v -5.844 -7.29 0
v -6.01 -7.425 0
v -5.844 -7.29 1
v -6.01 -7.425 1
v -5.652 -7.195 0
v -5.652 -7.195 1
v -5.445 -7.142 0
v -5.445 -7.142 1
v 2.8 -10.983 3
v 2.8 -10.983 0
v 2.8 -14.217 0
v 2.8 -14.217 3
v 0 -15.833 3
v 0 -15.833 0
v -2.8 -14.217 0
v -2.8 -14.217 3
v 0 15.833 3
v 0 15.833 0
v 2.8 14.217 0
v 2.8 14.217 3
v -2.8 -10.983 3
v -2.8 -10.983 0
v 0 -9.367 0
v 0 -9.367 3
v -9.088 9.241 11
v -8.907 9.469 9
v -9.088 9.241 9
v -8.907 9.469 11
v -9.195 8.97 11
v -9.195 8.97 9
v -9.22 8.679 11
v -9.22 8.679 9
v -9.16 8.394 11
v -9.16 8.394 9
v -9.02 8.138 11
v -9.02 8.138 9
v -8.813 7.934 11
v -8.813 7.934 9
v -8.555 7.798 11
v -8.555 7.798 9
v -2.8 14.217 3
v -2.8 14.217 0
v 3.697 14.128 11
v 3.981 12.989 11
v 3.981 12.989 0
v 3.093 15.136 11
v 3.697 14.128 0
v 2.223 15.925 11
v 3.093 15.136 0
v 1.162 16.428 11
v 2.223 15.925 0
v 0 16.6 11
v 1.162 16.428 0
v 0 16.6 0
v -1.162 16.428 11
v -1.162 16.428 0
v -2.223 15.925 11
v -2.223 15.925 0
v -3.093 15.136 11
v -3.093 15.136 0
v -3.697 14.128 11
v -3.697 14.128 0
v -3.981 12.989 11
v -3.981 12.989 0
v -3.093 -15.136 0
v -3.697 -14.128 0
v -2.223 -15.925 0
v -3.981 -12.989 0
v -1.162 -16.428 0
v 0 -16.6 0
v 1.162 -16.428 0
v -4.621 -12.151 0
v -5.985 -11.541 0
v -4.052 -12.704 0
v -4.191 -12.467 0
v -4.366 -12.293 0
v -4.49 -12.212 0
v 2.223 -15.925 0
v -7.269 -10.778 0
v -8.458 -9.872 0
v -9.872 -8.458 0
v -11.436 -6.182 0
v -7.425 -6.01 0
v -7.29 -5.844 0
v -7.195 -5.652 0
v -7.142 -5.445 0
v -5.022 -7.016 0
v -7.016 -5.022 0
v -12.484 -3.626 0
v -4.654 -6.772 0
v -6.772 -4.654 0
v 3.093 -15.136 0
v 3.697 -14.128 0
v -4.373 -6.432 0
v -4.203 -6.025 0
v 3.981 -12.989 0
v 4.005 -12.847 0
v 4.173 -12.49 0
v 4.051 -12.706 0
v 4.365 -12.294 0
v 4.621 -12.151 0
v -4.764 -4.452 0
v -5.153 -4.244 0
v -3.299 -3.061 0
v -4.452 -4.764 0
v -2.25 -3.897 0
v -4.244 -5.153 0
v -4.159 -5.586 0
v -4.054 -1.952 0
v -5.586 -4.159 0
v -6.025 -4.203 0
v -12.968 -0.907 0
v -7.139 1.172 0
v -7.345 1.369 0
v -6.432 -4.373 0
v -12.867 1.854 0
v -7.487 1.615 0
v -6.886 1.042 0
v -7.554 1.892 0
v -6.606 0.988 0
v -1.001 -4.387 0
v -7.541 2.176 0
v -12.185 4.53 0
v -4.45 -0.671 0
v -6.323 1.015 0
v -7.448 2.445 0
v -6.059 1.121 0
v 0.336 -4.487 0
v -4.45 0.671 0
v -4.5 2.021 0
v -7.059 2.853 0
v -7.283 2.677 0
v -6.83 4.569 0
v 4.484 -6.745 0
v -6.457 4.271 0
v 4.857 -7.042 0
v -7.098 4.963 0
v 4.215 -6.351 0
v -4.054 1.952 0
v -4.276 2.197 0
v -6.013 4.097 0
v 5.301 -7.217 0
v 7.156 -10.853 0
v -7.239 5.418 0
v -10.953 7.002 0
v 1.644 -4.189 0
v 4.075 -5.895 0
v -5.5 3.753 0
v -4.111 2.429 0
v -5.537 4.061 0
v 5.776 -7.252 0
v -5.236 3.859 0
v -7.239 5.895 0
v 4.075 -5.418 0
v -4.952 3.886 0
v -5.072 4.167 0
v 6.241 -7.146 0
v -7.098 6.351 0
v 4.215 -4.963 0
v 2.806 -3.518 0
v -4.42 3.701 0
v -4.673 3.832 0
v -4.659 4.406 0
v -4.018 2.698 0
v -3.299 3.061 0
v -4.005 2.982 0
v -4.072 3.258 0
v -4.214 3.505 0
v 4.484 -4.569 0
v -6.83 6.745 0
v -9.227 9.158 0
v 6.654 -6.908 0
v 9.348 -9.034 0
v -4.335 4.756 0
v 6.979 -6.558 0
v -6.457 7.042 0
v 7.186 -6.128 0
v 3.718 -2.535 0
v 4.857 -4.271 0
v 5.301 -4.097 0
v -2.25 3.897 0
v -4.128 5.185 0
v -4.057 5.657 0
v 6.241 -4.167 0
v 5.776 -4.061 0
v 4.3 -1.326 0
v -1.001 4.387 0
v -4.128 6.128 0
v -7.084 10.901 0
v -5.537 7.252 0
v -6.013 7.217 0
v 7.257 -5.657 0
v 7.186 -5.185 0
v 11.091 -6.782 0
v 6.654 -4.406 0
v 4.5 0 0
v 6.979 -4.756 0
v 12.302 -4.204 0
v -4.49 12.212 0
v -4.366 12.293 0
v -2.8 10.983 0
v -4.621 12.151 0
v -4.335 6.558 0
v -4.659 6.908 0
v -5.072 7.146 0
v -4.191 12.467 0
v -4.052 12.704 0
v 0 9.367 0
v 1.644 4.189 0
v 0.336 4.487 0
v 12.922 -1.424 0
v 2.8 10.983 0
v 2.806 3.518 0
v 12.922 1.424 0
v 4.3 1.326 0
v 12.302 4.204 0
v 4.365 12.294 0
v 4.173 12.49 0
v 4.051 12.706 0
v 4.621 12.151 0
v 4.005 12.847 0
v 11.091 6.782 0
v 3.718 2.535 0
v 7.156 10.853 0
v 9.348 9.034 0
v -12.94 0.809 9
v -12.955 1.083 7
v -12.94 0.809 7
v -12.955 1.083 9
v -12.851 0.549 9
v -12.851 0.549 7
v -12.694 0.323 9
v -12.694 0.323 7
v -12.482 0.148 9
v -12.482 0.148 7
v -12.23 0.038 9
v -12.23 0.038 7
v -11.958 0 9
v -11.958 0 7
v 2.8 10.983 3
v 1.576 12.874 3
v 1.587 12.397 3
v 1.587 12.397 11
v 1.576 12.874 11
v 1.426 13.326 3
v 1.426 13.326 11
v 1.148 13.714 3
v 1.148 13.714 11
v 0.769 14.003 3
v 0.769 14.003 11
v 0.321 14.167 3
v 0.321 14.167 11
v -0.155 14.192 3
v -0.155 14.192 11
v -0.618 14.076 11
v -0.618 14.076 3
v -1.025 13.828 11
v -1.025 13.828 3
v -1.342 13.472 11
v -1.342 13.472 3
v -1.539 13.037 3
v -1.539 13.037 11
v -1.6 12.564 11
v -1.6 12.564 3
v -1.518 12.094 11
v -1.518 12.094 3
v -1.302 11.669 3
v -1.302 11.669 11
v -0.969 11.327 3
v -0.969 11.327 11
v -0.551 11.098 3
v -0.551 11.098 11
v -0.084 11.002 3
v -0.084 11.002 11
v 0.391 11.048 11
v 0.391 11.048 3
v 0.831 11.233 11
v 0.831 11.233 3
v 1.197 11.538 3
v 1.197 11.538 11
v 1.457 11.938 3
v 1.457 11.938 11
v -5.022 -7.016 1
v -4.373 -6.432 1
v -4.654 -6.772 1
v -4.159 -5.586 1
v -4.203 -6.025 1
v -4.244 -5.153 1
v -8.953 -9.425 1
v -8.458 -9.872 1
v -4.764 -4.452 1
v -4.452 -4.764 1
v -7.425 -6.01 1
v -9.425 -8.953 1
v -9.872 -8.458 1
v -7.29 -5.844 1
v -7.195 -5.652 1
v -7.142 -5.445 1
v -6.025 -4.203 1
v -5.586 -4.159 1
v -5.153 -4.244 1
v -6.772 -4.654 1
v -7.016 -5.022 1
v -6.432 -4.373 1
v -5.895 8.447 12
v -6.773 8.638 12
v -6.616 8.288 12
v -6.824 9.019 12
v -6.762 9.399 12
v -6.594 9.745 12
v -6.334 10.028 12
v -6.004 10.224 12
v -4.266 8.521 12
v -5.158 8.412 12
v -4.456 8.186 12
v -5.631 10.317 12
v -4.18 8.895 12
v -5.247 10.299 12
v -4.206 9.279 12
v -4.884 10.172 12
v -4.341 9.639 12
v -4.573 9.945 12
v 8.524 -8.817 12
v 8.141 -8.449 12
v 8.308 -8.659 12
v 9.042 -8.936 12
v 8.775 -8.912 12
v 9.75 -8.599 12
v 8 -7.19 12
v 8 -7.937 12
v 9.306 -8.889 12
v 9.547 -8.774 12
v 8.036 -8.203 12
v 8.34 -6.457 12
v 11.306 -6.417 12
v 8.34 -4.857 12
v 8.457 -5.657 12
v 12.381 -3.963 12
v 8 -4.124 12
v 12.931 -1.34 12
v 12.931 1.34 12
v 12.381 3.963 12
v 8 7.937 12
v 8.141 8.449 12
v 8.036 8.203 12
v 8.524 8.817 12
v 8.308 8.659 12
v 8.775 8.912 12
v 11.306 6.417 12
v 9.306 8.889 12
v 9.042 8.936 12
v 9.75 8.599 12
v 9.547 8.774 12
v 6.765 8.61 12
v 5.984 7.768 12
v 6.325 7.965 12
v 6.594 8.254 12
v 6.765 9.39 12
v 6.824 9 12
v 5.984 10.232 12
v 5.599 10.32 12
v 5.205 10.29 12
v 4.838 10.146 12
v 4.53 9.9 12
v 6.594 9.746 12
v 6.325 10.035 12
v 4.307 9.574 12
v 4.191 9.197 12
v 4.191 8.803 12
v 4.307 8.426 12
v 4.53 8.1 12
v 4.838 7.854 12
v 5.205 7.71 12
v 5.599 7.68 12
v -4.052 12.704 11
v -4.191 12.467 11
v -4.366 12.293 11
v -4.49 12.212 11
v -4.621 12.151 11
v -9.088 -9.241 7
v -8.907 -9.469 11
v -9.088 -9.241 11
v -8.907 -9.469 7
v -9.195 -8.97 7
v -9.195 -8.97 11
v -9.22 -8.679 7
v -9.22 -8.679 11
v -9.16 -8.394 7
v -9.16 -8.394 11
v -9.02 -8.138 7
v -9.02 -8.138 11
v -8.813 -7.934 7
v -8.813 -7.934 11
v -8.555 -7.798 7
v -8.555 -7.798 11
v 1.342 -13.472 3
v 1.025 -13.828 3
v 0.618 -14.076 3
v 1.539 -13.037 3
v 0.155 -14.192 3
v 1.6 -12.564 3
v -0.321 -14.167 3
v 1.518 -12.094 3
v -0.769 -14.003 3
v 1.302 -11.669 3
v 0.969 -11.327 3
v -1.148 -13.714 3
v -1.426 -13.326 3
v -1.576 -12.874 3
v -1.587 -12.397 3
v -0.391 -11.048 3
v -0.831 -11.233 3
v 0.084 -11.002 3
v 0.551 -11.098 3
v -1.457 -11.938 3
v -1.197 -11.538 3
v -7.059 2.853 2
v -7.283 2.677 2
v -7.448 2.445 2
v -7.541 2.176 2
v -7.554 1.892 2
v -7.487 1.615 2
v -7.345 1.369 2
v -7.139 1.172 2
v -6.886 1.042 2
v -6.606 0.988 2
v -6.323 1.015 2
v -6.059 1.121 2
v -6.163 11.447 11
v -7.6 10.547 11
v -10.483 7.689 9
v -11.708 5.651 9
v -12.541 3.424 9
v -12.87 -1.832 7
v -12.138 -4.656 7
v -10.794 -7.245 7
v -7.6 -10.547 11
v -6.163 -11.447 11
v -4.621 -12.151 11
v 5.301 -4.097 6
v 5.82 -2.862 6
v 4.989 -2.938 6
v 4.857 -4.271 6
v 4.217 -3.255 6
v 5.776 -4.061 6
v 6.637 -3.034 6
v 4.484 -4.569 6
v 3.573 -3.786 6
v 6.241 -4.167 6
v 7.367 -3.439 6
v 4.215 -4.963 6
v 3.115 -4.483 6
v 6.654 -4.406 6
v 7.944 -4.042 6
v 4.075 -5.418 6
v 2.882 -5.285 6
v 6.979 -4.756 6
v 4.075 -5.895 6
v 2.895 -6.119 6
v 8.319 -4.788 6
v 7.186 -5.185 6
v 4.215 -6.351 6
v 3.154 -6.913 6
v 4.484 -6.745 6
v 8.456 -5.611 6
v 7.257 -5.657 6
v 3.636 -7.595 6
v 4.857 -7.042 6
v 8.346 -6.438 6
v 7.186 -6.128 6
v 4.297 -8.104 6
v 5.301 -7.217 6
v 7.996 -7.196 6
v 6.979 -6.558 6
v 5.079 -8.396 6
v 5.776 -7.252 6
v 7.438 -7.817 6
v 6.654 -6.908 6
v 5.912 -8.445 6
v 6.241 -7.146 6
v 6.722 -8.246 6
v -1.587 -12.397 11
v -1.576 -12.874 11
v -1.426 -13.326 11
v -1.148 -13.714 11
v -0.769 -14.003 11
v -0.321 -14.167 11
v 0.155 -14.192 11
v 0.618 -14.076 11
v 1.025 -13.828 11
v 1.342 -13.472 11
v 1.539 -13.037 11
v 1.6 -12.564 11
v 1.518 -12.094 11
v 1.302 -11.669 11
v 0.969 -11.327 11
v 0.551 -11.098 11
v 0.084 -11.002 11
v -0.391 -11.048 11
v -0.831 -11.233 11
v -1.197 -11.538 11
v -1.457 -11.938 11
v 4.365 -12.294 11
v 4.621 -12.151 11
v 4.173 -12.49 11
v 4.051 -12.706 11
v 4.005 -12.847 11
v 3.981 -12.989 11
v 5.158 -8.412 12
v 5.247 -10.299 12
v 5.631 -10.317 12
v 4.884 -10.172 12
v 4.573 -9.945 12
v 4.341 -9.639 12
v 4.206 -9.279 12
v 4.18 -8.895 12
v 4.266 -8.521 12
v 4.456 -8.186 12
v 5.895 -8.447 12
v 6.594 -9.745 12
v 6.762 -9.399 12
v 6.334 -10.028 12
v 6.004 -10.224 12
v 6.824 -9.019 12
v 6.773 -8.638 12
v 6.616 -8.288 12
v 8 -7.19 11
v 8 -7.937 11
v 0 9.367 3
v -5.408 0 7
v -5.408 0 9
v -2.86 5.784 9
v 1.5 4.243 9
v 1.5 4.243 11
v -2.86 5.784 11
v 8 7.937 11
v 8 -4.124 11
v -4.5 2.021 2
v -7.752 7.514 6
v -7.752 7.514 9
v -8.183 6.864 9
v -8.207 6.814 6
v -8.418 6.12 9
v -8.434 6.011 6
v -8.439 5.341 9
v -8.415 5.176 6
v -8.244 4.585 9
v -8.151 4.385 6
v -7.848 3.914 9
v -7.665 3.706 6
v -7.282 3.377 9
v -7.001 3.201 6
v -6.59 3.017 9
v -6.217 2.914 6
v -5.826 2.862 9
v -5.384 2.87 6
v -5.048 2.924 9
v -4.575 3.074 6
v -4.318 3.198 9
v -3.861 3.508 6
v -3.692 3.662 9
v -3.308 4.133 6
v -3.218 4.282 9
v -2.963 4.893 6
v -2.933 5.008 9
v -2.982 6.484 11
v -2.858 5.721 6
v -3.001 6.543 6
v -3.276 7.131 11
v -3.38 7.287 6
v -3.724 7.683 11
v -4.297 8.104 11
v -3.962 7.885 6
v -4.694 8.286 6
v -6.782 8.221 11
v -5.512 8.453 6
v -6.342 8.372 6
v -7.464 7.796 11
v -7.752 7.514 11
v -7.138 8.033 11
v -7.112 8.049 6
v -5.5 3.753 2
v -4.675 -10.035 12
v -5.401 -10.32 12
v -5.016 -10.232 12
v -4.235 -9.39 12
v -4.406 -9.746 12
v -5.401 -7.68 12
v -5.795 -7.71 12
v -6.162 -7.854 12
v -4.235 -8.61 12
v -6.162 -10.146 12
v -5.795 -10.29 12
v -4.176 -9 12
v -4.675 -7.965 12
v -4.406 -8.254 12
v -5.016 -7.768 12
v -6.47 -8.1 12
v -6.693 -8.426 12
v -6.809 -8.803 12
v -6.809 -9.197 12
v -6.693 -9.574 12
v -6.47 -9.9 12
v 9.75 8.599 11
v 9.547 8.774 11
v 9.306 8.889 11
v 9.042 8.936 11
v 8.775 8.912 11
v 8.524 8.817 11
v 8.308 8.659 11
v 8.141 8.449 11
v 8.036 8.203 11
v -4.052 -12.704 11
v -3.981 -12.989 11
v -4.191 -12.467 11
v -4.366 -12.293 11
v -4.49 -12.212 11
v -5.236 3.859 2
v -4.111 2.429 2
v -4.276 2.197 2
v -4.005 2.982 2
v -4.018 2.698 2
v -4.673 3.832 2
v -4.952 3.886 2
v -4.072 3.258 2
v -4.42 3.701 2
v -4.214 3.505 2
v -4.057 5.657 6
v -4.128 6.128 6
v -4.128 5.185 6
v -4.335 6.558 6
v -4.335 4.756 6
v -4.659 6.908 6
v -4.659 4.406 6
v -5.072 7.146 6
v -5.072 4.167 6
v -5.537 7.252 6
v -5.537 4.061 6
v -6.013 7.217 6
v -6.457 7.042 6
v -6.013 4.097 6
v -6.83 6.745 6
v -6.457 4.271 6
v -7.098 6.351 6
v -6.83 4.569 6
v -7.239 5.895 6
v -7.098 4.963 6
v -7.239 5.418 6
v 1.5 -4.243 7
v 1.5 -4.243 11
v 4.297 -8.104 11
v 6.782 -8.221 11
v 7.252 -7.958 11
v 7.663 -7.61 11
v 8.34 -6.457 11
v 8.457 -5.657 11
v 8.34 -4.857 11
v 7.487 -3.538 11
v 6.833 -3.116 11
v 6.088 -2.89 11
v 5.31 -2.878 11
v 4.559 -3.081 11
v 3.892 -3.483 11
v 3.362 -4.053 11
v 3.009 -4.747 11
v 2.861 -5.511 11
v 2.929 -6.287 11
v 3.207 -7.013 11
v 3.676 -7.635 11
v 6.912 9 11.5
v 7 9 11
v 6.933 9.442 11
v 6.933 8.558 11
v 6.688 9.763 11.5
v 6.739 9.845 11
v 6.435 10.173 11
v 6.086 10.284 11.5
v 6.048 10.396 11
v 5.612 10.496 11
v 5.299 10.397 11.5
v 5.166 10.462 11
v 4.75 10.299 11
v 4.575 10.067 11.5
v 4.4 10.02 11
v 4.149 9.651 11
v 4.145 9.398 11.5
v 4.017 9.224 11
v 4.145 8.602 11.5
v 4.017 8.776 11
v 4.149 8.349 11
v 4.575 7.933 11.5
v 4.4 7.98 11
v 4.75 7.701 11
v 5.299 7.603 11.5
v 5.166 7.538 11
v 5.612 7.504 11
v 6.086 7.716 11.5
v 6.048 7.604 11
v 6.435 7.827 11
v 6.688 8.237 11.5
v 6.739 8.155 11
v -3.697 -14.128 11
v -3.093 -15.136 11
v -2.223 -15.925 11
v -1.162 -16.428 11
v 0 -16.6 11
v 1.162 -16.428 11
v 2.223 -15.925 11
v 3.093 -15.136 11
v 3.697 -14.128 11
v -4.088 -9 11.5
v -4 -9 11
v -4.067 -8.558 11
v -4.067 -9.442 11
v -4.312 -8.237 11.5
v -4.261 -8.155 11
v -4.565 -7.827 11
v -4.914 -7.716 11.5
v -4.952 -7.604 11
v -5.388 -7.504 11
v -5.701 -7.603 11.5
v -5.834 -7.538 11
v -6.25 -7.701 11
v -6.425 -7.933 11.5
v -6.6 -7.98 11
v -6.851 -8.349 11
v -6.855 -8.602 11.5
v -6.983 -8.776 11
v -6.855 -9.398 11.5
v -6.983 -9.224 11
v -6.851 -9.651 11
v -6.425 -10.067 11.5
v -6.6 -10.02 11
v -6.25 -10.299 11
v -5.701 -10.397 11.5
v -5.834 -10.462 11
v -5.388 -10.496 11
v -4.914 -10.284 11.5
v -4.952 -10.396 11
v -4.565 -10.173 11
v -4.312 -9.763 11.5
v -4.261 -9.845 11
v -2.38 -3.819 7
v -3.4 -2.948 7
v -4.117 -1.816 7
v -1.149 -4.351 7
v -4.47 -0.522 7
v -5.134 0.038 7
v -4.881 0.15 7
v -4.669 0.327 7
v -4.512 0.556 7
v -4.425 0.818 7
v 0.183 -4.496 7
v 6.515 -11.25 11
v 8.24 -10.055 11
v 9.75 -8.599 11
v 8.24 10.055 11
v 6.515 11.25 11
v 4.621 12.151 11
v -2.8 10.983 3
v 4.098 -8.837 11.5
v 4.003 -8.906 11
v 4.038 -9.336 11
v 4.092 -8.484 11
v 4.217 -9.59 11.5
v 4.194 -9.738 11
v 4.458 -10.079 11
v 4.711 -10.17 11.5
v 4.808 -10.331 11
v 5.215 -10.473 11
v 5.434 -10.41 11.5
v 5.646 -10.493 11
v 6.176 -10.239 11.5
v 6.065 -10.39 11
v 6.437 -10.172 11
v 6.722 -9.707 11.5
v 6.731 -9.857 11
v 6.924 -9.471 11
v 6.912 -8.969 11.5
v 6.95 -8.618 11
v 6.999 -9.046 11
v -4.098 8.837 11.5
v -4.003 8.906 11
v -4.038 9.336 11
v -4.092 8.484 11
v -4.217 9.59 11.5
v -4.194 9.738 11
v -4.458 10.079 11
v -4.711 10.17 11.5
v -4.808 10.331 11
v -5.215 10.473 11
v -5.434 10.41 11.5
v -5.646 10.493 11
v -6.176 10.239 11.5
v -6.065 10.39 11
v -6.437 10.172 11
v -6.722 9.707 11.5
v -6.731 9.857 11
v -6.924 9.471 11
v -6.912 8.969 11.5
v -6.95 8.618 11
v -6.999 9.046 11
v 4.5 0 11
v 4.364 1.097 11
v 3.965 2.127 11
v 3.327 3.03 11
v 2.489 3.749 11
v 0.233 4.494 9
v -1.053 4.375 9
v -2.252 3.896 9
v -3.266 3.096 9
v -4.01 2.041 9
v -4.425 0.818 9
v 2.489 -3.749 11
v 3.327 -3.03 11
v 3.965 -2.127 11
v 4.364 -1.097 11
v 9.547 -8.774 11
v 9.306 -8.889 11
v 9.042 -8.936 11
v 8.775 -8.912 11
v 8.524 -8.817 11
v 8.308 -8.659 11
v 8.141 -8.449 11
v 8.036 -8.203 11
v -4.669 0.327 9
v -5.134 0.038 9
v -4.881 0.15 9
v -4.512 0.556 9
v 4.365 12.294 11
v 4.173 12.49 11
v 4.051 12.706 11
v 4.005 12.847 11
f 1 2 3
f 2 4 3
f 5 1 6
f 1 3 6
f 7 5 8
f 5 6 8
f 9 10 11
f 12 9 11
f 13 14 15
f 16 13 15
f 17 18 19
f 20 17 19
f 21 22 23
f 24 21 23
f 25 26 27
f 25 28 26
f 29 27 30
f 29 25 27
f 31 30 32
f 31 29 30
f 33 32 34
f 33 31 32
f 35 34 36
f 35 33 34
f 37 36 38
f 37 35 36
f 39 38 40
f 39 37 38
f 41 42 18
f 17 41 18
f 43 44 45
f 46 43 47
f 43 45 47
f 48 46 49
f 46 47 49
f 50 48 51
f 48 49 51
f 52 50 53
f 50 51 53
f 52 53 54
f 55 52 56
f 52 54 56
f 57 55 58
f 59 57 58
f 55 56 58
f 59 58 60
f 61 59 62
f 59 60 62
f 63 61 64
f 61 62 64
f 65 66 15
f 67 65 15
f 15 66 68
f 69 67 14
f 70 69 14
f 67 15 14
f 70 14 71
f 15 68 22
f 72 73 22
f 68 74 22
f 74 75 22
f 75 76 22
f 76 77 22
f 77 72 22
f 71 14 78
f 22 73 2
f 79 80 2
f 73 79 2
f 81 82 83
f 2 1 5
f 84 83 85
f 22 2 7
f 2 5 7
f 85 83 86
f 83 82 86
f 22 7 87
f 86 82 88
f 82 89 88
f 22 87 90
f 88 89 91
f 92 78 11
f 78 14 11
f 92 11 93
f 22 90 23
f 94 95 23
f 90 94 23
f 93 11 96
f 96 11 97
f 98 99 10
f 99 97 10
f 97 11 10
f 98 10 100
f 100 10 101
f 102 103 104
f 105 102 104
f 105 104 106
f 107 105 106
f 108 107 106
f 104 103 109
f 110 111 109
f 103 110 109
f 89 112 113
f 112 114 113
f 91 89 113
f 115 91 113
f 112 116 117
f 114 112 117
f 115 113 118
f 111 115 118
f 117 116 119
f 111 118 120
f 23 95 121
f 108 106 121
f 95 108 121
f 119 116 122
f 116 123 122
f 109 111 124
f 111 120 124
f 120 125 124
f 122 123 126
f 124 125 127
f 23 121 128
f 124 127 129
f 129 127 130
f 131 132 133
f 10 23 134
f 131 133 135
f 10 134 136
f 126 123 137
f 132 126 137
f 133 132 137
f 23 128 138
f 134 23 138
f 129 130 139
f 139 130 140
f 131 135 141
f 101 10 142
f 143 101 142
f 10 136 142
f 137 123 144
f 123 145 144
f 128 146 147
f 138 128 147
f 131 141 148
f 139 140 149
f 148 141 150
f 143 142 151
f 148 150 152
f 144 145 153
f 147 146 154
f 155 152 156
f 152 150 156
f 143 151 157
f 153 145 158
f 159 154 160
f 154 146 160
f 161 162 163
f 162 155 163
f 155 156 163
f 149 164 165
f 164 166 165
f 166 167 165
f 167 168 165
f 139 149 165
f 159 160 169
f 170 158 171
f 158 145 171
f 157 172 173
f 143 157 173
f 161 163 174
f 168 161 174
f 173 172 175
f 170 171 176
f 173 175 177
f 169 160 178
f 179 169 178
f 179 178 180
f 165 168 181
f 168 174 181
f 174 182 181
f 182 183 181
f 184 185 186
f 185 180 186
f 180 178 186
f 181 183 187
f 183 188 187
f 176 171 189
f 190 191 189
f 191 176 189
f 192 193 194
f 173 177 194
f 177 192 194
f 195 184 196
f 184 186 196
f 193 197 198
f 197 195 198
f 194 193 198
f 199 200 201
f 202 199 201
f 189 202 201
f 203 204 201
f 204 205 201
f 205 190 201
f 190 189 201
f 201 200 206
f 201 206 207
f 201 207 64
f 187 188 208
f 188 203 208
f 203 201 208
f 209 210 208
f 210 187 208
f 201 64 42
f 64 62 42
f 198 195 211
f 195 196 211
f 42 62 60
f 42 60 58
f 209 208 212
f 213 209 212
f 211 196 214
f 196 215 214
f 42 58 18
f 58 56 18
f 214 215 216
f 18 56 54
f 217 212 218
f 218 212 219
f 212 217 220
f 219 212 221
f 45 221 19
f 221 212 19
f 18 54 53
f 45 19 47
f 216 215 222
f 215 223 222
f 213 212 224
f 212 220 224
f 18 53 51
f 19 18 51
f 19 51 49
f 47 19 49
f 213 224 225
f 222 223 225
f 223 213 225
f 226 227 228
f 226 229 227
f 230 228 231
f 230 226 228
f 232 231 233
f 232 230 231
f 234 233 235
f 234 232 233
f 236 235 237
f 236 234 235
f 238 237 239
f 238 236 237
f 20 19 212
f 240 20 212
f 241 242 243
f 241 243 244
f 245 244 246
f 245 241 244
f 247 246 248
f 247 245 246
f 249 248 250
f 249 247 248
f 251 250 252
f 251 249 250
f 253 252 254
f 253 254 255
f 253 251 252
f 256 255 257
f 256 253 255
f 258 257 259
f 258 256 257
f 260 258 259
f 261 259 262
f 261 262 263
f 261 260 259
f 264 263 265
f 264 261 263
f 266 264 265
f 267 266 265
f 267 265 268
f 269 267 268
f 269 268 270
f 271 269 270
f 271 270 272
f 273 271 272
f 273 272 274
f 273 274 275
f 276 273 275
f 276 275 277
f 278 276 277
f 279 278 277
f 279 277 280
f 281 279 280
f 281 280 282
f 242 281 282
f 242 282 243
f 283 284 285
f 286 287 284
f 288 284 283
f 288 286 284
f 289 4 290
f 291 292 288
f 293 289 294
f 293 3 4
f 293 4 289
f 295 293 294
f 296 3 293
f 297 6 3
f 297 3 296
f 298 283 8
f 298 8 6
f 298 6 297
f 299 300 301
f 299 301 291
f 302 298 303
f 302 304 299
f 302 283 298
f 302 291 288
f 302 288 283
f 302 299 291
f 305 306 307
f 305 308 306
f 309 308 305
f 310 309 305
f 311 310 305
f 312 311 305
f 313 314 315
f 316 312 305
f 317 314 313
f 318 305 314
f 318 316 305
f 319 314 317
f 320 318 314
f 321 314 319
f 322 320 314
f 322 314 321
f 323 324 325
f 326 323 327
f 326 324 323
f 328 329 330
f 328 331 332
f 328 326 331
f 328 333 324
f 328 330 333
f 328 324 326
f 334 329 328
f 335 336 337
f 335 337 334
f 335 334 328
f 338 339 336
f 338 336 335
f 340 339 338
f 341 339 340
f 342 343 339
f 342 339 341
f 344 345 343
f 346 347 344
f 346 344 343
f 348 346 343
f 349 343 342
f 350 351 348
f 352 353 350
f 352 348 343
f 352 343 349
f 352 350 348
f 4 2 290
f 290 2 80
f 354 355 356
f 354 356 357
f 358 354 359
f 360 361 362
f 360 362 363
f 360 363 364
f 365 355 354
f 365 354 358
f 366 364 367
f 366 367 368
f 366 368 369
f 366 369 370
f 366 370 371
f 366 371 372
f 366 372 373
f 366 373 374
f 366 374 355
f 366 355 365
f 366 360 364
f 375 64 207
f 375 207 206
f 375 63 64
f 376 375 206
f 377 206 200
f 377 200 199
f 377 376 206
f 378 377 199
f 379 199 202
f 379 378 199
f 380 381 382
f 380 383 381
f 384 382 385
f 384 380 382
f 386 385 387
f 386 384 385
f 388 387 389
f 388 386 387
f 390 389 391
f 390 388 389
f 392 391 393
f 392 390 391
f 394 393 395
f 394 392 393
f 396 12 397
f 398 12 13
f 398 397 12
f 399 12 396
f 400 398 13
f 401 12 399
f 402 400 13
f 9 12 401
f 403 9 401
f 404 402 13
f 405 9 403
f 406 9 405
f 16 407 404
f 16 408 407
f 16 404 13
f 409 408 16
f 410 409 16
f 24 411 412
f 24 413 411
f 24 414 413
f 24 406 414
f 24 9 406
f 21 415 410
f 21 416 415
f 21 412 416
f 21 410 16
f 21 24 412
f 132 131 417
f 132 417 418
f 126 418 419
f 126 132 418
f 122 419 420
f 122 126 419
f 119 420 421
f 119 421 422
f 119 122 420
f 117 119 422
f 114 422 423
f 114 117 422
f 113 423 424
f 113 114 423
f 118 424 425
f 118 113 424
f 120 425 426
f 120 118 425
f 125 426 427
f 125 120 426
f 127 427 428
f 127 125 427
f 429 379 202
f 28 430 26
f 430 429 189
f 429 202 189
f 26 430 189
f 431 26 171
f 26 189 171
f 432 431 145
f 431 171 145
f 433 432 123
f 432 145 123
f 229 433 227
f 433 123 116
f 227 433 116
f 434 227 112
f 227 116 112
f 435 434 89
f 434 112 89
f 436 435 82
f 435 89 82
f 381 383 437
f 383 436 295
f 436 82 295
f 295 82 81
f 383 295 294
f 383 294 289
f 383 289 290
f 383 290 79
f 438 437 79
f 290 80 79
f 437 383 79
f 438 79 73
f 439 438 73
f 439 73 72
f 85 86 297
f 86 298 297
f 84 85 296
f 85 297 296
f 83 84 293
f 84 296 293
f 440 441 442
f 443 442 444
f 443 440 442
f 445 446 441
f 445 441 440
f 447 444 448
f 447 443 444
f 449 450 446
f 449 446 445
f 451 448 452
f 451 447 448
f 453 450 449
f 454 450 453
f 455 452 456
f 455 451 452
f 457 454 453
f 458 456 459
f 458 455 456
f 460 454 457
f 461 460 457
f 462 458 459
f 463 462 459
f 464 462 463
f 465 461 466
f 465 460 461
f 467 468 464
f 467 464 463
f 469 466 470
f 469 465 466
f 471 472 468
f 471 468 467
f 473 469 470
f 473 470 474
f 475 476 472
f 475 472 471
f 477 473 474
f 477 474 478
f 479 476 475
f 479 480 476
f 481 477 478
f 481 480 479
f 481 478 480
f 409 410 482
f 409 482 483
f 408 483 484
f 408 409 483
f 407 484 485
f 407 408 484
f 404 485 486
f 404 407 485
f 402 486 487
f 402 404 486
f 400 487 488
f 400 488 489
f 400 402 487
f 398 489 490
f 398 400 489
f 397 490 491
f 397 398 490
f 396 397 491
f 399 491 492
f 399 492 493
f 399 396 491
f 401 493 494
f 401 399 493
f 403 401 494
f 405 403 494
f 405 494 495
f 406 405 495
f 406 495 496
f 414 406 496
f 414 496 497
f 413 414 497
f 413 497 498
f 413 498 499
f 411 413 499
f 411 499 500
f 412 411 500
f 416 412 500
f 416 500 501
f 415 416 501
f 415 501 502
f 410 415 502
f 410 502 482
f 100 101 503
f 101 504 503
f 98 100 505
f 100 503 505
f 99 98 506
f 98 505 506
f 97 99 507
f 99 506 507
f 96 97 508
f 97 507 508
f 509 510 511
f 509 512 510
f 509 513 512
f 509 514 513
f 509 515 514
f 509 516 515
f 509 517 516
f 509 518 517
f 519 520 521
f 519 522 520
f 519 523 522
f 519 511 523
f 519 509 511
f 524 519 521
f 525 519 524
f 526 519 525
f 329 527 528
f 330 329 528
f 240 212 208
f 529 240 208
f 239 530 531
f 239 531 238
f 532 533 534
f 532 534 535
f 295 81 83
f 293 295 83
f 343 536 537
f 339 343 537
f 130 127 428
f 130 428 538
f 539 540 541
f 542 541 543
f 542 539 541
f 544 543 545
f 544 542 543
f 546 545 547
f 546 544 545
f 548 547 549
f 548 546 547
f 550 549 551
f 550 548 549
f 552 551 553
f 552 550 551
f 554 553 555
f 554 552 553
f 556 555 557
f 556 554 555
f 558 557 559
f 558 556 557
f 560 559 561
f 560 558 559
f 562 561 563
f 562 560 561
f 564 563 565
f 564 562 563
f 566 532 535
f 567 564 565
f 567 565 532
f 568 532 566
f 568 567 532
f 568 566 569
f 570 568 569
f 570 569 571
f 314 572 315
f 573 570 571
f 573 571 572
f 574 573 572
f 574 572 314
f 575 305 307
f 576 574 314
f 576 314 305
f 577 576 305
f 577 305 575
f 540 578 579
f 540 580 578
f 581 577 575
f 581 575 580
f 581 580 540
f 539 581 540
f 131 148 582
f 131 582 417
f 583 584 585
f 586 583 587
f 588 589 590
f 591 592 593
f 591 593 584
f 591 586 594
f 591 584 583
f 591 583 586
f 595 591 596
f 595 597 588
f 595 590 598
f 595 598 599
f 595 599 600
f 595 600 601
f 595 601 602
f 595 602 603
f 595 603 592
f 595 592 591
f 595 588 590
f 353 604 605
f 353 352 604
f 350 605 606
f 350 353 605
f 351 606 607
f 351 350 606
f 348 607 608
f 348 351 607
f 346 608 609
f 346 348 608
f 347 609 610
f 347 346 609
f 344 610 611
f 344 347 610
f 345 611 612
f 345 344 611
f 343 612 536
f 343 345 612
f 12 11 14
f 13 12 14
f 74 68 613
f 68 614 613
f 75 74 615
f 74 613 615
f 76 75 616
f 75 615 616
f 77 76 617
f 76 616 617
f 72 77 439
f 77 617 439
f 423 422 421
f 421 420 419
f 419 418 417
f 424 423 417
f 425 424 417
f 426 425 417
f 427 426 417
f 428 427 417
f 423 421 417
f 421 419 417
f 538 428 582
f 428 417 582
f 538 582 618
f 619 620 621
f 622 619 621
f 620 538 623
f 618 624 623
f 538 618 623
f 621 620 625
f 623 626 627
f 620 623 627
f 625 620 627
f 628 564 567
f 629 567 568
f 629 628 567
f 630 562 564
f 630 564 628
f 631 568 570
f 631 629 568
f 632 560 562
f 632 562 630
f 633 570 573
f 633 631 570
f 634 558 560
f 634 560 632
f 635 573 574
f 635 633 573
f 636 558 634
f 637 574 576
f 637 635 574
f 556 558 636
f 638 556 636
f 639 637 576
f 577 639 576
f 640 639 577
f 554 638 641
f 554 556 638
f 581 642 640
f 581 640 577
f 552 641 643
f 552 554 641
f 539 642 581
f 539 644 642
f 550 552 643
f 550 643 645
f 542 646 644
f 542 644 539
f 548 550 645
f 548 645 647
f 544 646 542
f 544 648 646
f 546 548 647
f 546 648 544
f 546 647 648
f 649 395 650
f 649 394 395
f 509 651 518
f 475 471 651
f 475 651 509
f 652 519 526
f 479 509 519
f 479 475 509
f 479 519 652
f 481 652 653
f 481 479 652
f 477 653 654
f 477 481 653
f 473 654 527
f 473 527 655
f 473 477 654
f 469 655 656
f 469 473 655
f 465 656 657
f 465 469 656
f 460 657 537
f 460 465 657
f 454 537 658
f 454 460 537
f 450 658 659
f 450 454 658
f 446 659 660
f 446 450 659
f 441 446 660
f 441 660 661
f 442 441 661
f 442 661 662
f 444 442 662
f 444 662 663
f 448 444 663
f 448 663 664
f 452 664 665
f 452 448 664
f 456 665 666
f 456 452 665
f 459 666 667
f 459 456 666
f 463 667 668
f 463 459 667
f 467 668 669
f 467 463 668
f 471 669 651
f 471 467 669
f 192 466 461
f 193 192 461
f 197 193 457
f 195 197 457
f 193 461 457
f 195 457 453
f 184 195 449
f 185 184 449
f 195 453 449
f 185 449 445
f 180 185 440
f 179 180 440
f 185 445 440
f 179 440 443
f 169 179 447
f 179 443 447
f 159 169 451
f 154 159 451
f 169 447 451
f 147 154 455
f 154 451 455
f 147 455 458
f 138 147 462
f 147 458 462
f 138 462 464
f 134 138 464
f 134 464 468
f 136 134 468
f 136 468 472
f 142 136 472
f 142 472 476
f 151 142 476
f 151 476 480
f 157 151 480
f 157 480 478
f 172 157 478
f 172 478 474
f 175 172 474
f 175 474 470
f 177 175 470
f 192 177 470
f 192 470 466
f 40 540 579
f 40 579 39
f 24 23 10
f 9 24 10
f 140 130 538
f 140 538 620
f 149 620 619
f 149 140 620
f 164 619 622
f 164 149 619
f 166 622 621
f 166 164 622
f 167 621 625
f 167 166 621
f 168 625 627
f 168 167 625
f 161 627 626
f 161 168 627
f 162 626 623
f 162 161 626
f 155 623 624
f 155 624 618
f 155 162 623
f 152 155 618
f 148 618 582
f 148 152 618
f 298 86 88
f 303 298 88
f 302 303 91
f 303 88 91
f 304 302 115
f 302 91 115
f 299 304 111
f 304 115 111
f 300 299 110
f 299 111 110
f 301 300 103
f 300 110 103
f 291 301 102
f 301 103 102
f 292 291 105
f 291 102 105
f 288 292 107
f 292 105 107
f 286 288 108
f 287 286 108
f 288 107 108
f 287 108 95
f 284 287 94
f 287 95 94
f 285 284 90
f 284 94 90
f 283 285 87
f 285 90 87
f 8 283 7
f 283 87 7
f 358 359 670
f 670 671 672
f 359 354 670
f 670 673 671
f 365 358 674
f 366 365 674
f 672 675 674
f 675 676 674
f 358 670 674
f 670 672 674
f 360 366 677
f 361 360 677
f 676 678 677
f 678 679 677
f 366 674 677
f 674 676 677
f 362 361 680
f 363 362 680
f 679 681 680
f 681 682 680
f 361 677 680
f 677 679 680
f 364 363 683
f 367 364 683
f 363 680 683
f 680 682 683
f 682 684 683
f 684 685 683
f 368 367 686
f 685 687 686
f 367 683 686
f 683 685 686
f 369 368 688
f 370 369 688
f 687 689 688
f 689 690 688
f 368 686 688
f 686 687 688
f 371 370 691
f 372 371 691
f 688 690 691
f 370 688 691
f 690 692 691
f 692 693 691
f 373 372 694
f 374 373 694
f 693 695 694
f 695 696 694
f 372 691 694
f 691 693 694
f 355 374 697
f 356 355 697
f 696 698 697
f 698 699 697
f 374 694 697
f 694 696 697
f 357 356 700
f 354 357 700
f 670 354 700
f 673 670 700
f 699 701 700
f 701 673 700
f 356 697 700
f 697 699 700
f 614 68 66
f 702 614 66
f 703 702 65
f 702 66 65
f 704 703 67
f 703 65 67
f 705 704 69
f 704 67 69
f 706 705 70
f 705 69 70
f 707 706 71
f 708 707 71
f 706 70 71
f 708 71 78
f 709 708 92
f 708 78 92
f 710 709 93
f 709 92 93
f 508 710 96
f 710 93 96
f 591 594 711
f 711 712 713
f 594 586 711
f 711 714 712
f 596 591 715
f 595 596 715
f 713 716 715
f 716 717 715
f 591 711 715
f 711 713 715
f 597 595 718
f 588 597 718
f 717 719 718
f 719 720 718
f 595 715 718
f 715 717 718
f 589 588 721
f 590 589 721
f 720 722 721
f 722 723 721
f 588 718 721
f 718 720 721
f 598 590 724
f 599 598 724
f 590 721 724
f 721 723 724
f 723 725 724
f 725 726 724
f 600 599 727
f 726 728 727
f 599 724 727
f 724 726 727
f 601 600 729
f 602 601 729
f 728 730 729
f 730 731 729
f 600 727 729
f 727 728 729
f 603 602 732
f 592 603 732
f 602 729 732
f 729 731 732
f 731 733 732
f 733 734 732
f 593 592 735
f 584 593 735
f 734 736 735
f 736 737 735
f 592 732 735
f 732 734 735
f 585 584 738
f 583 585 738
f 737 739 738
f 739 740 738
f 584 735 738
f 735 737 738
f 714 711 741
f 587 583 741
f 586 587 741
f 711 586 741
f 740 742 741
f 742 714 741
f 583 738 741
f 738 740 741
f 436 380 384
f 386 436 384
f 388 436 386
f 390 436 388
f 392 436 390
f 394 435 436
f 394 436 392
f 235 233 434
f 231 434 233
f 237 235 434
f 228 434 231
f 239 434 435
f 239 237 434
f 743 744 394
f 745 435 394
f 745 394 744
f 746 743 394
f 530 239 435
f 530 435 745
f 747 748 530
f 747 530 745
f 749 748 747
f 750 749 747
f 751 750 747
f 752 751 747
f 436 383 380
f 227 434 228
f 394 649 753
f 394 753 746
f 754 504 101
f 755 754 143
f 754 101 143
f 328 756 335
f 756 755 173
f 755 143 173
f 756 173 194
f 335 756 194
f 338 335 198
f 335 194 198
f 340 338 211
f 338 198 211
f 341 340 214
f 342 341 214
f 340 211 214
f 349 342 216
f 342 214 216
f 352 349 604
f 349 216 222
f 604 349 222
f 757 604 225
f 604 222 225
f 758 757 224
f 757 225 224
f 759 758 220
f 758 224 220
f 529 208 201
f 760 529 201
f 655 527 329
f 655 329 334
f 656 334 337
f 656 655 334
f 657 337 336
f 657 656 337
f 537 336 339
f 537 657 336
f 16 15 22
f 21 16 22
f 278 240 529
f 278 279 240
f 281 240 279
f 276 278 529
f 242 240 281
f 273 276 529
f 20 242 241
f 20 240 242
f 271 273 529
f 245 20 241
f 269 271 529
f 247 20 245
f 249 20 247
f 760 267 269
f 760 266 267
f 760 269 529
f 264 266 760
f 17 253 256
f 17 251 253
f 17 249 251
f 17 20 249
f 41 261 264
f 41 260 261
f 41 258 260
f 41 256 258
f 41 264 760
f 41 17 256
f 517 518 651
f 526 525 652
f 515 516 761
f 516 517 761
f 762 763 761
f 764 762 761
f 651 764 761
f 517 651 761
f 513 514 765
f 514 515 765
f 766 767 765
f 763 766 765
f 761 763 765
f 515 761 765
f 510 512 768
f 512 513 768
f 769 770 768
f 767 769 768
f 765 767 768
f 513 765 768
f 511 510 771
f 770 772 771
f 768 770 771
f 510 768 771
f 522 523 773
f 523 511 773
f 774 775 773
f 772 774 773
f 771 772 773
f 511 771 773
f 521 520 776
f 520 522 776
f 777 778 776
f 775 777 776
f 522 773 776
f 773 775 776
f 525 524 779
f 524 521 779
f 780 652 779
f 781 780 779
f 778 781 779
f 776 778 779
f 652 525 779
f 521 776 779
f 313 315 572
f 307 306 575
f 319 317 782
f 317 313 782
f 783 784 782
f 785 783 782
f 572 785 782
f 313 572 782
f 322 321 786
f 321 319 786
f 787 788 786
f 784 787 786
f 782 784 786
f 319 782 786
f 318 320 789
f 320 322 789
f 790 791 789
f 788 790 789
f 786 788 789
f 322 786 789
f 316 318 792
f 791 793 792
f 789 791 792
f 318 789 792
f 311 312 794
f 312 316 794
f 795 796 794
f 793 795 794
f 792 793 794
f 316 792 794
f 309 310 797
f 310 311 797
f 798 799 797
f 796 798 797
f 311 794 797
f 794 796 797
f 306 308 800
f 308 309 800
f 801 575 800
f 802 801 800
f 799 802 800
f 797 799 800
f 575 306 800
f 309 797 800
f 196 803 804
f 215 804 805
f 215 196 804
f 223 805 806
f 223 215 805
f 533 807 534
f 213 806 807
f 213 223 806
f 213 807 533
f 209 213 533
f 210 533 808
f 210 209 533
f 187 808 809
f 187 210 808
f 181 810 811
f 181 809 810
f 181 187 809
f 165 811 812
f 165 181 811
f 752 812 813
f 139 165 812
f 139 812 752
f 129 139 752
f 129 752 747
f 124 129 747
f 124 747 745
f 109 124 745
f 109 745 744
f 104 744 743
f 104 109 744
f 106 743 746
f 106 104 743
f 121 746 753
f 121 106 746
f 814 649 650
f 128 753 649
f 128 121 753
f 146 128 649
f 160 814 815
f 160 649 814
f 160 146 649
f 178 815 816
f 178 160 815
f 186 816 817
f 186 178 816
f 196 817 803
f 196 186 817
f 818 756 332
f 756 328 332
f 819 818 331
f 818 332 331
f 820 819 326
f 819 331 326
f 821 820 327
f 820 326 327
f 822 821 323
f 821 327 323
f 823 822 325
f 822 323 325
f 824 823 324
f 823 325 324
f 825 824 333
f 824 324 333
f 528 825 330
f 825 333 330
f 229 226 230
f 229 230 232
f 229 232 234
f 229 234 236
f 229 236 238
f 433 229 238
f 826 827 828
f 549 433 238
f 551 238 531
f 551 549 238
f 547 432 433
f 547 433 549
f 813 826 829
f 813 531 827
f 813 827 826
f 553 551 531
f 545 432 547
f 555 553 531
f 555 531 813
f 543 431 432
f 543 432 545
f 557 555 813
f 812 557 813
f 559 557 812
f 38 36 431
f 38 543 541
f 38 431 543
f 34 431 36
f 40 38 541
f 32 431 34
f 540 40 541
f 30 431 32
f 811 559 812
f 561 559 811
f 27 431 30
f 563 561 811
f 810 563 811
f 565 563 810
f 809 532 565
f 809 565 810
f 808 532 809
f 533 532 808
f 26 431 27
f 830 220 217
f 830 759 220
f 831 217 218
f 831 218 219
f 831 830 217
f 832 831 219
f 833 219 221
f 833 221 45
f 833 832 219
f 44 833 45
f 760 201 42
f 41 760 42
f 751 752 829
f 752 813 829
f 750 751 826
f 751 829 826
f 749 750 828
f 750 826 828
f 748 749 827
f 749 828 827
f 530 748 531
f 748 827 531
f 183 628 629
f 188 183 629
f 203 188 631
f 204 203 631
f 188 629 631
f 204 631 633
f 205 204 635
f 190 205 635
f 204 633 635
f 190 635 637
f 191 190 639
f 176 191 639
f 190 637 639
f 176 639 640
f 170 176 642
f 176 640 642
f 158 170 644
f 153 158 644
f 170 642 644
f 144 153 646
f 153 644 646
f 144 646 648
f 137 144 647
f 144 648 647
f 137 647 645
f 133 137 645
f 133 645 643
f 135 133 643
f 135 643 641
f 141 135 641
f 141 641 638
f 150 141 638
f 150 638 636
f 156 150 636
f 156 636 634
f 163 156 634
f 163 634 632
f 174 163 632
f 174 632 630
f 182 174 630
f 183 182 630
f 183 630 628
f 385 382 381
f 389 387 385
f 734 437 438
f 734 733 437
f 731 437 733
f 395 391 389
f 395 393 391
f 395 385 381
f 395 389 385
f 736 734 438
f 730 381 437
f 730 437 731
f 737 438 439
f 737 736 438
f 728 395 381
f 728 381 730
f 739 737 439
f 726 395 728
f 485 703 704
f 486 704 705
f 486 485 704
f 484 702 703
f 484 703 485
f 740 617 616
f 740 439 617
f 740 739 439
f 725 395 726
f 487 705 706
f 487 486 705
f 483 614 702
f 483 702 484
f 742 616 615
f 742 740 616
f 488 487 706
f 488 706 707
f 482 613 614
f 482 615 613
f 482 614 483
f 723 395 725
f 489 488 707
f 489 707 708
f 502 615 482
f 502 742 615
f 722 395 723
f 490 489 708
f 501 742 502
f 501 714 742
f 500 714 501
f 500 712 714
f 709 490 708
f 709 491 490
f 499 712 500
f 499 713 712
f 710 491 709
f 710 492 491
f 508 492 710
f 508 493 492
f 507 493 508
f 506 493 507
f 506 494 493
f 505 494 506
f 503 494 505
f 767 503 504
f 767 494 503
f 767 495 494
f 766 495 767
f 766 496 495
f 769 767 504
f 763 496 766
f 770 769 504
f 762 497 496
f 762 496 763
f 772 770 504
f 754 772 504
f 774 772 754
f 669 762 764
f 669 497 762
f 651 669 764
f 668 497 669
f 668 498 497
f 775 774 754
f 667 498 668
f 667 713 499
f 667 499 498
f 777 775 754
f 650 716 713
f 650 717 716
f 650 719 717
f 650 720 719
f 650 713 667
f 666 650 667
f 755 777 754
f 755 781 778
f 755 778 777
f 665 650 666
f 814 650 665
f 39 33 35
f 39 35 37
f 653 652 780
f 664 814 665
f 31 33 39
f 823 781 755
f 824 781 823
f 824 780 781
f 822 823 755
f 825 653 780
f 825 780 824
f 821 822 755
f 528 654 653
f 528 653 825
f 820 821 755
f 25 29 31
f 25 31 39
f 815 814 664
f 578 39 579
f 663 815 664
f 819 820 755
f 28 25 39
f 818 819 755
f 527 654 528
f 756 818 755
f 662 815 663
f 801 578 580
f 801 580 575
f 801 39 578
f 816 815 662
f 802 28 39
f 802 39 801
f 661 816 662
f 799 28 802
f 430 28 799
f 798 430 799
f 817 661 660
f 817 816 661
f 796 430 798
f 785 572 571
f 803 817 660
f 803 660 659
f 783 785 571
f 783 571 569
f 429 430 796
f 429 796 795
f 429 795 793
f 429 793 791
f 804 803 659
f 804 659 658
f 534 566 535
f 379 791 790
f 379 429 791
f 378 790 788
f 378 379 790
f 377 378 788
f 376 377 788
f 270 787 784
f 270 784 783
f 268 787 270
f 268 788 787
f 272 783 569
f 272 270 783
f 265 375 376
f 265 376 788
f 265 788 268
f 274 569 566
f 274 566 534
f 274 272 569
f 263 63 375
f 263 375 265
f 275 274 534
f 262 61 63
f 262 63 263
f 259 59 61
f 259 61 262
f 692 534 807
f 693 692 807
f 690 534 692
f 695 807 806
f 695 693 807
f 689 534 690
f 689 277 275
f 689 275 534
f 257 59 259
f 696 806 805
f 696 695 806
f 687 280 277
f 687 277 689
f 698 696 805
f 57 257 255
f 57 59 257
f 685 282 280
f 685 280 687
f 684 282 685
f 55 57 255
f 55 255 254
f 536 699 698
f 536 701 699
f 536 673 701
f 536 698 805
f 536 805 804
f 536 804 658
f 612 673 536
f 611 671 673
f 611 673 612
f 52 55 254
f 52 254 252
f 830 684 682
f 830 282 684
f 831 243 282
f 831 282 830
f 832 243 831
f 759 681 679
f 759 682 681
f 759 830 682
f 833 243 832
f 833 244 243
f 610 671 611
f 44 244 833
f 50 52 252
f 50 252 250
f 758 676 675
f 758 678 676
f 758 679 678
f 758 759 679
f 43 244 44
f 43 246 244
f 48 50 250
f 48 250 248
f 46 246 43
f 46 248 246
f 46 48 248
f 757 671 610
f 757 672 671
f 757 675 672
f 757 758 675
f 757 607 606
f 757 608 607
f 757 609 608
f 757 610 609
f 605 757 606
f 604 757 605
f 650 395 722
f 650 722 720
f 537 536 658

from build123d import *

# Parameters (mm, degrees)
SKETCH1_R                     = 4.5
BOSS_EXTRUDE1_DEPTH           = 11
CUT_EXTRUDE1_START            = -2
CUT_EXTRUDE1_DEPTH            = 2
SKETCH3_R                     = 1.4999999999999996
BOSS_EXTRUDE2_DEPTH           = 1
BOSS_EXTRUDE2_DRAFT           = 10.000000000000021
BOSS_EXTRUDE2_PROFILE_2_DEPTH = 1
BOSS_EXTRUDE2_PROFILE_2_DRAFT = 10.000000000000021
BOSS_EXTRUDE2_PROFILE_3_DEPTH = 1
BOSS_EXTRUDE2_PROFILE_3_DRAFT = 10.000000000000021
SKETCH3_R_2                   = 1.5000000000000002
BOSS_EXTRUDE2_PROFILE_4_DEPTH = 1
BOSS_EXTRUDE2_PROFILE_4_DRAFT = 10.000000000000021
SKETCH4_R                     = 1.5999999999999999
CUT_EXTRUDE2_DEPTH            = 24.7815054191277
CUT_EXTRUDE3_DEPTH            = 24.7815054191277
CUT_EXTRUDE3_DEPTH_BACK       = 5
SKETCH5_R                     = 2.7999999999999994
SKETCH5_R_2                   = 2.8
CUT_EXTRUDE4_DEPTH            = 3
CUT_EXTRUDE5_START            = -2
CUT_EXTRUDE5_DEPTH            = 2
BOSS_EXTRUDE3_DEPTH           = 1
CUT_EXTRUDE6_DEPTH            = 1
FILLET1_R                     = 1
CUT_EXTRUDE7_DEPTH            = 2


with BuildPart() as part:
    # Sketch1 → Boss-Extrude1 (new body)
    with BuildSketch(Plane.XY):
        with BuildLine():
            ThreePointArc((3.993464047921404, -12.371428571428574), (13.000000000000002, 0), (3.9934640479214014, 12.371428571428574))
            ThreePointArc((3.9934640479214014, 12.371428571428574), (2.9081167199998763, 15.346426249302382), (-4.07e-15, 16.6))
            ThreePointArc((-4.07e-15, 16.6), (-2.908116719999883, 15.346426249302382), (-3.9934640479214067, 12.371428571428574))
            ThreePointArc((-3.9934640479214067, 12.371428571428574), (-13.000000000000002, 1.59e-15), (-3.993464047921404, -12.371428571428574))
            ThreePointArc((-3.993464047921404, -12.371428571428574), (-2.90811671999988, -15.346426249302382), (0, -16.6))
            ThreePointArc((0, -16.6), (2.90811671999988, -15.346426249302382), (3.993464047921404, -12.371428571428574))
        make_face()
        Circle(SKETCH1_R, mode=Mode.SUBTRACT)
        with BuildLine():
            ThreePointArc((1.5870475987269075, -12.396825396825397), (4.5e-16, -11), (-1.587047598726907, -12.396825396825397))
            ThreePointArc((-1.587047598726907, -12.396825396825397), (-2.6e-16, -14.2), (1.5870475987269075, -12.396825396825397))
        make_face(mode=Mode.SUBTRACT)
        with BuildLine():
            ThreePointArc((-1.5870475987270802, 12.396825396825376), (-4.89e-15, 10.99999999999983), (1.5870475987267345, 12.396825396825419))
            ThreePointArc((1.5870475987267345, 12.396825396825419), (-2.28e-15, 14.199999999999829), (-1.5870475987270802, 12.396825396825376))
        make_face(mode=Mode.SUBTRACT)
    extrude(amount=BOSS_EXTRUDE1_DEPTH)

    # Sketch2 → Cut-Extrude1 (cut)
    with BuildSketch(Plane.XY.offset(11).offset(CUT_EXTRUDE1_START)):
        with BuildLine():
            Line((-9.998792207106897, -8.30807765966944), (1.5, -4.242640687119285))
            Line((1.5, -4.242640687119285), (1.5, 4.242640687119285))
            Line((1.5, 4.242640687119285), (-9.998792207106897, 8.30807765966944))
            ThreePointArc((-9.998792207106897, 8.30807765966944), (-13.000000000000002, 1.59e-15), (-9.998792207106897, -8.30807765966944))
        make_face()
    extrude(amount=CUT_EXTRUDE1_DEPTH, mode=Mode.SUBTRACT)


with BuildPart() as boss_extrude2_tool:
    # Sketch3 → Boss-Extrude2 (with draft: the straight prism first)
    with BuildSketch(Plane.XY.offset(11)):
        with Locations((-5.5, -9)):
            Circle(SKETCH3_R)
    extrude(amount=BOSS_EXTRUDE2_DEPTH)
    # Boss-Extrude2: the draft: its side faces are tilted about the plane it starts from
    boss_extrude2_sides = [boss_extrude2_tool.faces().sort_by_distance(p)[0] for p in [
        (-7, -9, 11.5),
    ]]
    draft(boss_extrude2_sides, Plane.XY.offset(11), BOSS_EXTRUDE2_DRAFT)


with BuildPart() as part_1:
    add(part.part)

    # Boss-Extrude2: add boss_extrude2_tool
    add(boss_extrude2_tool.part)


with BuildPart() as boss_extrude2_profile_2_tool:
    # Sketch3 → Boss-Extrude2 profile 2 (with draft: the straight prism first)
    with BuildSketch(Plane.XY.offset(11)):
        with Locations((5.5, -9)):
            Circle(SKETCH3_R)
    extrude(amount=BOSS_EXTRUDE2_PROFILE_2_DEPTH)
    # Boss-Extrude2 profile 2: the draft: its side faces are tilted about the plane it starts from
    boss_extrude2_profile_2_sides = [boss_extrude2_profile_2_tool.faces().sort_by_distance(p)[0] for p in [
        (4, -9, 11.5),
    ]]
    draft(boss_extrude2_profile_2_sides, Plane.XY.offset(11), BOSS_EXTRUDE2_PROFILE_2_DRAFT)


with BuildPart() as part_2:
    add(part_1.part)

    # Boss-Extrude2 profile 2: add boss_extrude2_profile_2_tool
    add(boss_extrude2_profile_2_tool.part)


with BuildPart() as boss_extrude2_profile_3_tool:
    # Sketch3 → Boss-Extrude2 profile 3 (with draft: the straight prism first)
    with BuildSketch(Plane.XY.offset(11)):
        with Locations((5.499999999999998, 9)):
            Circle(SKETCH3_R)
    extrude(amount=BOSS_EXTRUDE2_PROFILE_3_DEPTH)
    # Boss-Extrude2 profile 3: the draft: its side faces are tilted about the plane it starts from
    boss_extrude2_profile_3_sides = [boss_extrude2_profile_3_tool.faces().sort_by_distance(p)[0] for p in [
        (4, 9, 11.5),
    ]]
    draft(boss_extrude2_profile_3_sides, Plane.XY.offset(11), BOSS_EXTRUDE2_PROFILE_3_DRAFT)


with BuildPart() as part_3:
    add(part_2.part)

    # Boss-Extrude2 profile 3: add boss_extrude2_profile_3_tool
    add(boss_extrude2_profile_3_tool.part)


with BuildPart() as boss_extrude2_profile_4_tool:
    # Sketch3 → Boss-Extrude2 profile 4 (with draft: the straight prism first)
    with BuildSketch(Plane.XY.offset(11)):
        with Locations((-5.500000000000003, 9)):
            Circle(SKETCH3_R_2)
    extrude(amount=BOSS_EXTRUDE2_PROFILE_4_DEPTH)
    # Boss-Extrude2 profile 4: the draft: its side faces are tilted about the plane it starts from
    boss_extrude2_profile_4_sides = [boss_extrude2_profile_4_tool.faces().sort_by_distance(p)[0] for p in [
        (-7, 9, 11.5),
    ]]
    draft(boss_extrude2_profile_4_sides, Plane.XY.offset(11), BOSS_EXTRUDE2_PROFILE_4_DRAFT)


with BuildPart() as part_4:
    add(part_3.part)

    # Boss-Extrude2 profile 4: add boss_extrude2_profile_4_tool
    add(boss_extrude2_profile_4_tool.part)

    # Sketch4 → Cut-Extrude2 (cut, through all)
    with BuildSketch(Plane.XY.offset(11)):
        with Locations((5.65685424949239, -5.656854249492369)):
            Circle(SKETCH4_R)
        with Locations((-5.65685424949239, 5.656854249492373)):
            Circle(SKETCH4_R)
    extrude(amount=-CUT_EXTRUDE2_DEPTH, mode=Mode.SUBTRACT)

    # Sketch5 → Cut-Extrude3 (cut, two sides: drawn at the far end of the back side and taken through both)
    with BuildSketch(Plane.XY.offset(11).offset(-CUT_EXTRUDE3_DEPTH_BACK)):
        with Locations(Location((5.65685424949239, -5.656854249492369, 0), (0, 0, 240.938574299))):
            Circle(SKETCH5_R)
        with Locations(Location((-5.656854249492392, 5.656854249492367, 0), (0, 0, 138.454024878))):
            Circle(SKETCH5_R_2)
    extrude(amount=CUT_EXTRUDE3_DEPTH + CUT_EXTRUDE3_DEPTH_BACK, mode=Mode.SUBTRACT)

    # Sketch6 → Cut-Extrude4 (cut)
    with BuildSketch(Plane(origin=(0, 0, 0), x_dir=(-1, 0, 0), z_dir=(0, 0, -1))):
        Polygon((9.73e-15, 9.366838492538095), (2.800000000000004, 10.983419246269044), (2.800000000000004, 14.216580753730957), (1.041e-14, 15.833161507461904), (-2.7999999999999936, 14.21658075373095), (-2.7999999999999936, 10.98341924626905), align=None)
        Polygon((8.7e-16, -9.366838492538093), (-2.7999999999999994, -10.983419246269044), (-2.7999999999999994, -14.216580753730952), (-7.6e-16, -15.833161507461904), (2.7999999999999994, -14.216580753730952), (2.8000000000000003, -10.983419246269046), align=None)
    extrude(amount=-CUT_EXTRUDE4_DEPTH, mode=Mode.SUBTRACT)

    # Sketch7 → Cut-Extrude5 (cut)
    with BuildSketch(Plane.XY.offset(9).offset(CUT_EXTRUDE5_START)):
        with BuildLine():
            Line((-4.5, 5.5e-16), (-13.000000000000004, 1.59e-15))
            ThreePointArc((-13.000000000000004, 1.59e-15), (-12.226698219314768, -4.4167692552141835), (-9.998792207106897, -8.30807765966944))
            Line((-9.998792207106897, -8.30807765966944), (1.4999999999999987, -4.242640687119285))
            ThreePointArc((1.4999999999999987, -4.242640687119285), (-2.598076211353315, -3.6742346141747677), (-4.5, 5.5e-16))
        make_face()
    extrude(amount=CUT_EXTRUDE5_DEPTH, mode=Mode.SUBTRACT)

    # Sketch8 → Boss-Extrude3 (add)
    with BuildSketch(Plane.XY.offset(11)):
        with BuildLine():
            Line((8.000000000000002, 10.2469507659596), (8.000000000000002, -4.123991570751015))
            ThreePointArc((8.000000000000002, -4.123991570751015), (8.456854249492391, -5.656854249492369), (8.000000000000002, -7.189716928233723))
            Line((8.000000000000002, -7.189716928233723), (8.000000000000002, -10.2469507659596))
            ThreePointArc((8.000000000000002, -10.2469507659596), (13.000000000000002, 0), (8.000000000000002, 10.2469507659596))
        make_face()
    extrude(amount=BOSS_EXTRUDE3_DEPTH)

    # Sketch9 → Cut-Extrude6 (cut)
    with BuildSketch(Plane(origin=(0, 0, 0), x_dir=(-1, 0, 0), z_dir=(0, 0, -1))):
        with BuildLine():
            Line((5.740316883347941, -7.154530445721011), (8.45804460872515, -9.87225817109821))
            ThreePointArc((8.45804460872515, -9.87225817109821), (9.192388155425135, -9.192388155425098), (9.872258171098244, -8.458044608725112))
            Line((9.872258171098244, -8.458044608725112), (7.154530445721033, -5.740316883347915))
            ThreePointArc((7.154530445721033, -5.740316883347915), (4.596194077712568, -4.59619407771255), (5.740316883347941, -7.154530445721011))
        make_face()
    extrude(amount=-CUT_EXTRUDE6_DEPTH, mode=Mode.SUBTRACT)

    # Fillet1
    fillet1_edges = [part_4.edges().sort_by_distance(p)[0] for p in [
        (-3.993464047921405, -12.371428571428574, 5.5),
        (-3.9934640479214067, 12.371428571428574, 5.5),
        (3.9934640479214023, 12.371428571428574, 5.5),
        (3.9934640479214036, -12.371428571428574, 5.5),
        (-4.5, 7.8e-16, 8),
        (-13.000000000000005, 1.59e-15, 8),
        (8.000000000000002, -10.2469507659596, 11.5),
        (8.000000000000002, 10.2469507659596, 11.5),
        (-5.7403168833479405, -7.1545304457210115, 0.5),
        (-7.154530445721033, -5.740316883347915, 0.5),
        (-9.998792207106899, -8.30807765966944, 9),
        (-9.998792207106895, 8.30807765966944, 10),
    ]]
    fillet(fillet1_edges, radius=FILLET1_R)

    # Sketch10 → Cut-Extrude7 (cut)
    with BuildSketch(Plane(origin=(0, 0, 0), x_dir=(-1, 0, 0), z_dir=(0, 0, -1))):
        with BuildLine():
            Line((5.500000000000001, 3.7527767497325657), (7.058845726811989, 2.8527767497325622))
            ThreePointArc((7.058845726811989, 2.8527767497325622), (7.424871130596426, 1.4867513459481236), (6.058845726811987, 1.120725942163687))
            Line((6.058845726811987, 1.120725942163687), (4.499999999999998, 2.0207259421636885))
            ThreePointArc((4.499999999999998, 2.0207259421636885), (4.13397459621556, 3.3867513459481287), (5.500000000000001, 3.7527767497325657))
        make_face()
    extrude(amount=-CUT_EXTRUDE7_DEPTH, mode=Mode.SUBTRACT)


solid = part_4.part
